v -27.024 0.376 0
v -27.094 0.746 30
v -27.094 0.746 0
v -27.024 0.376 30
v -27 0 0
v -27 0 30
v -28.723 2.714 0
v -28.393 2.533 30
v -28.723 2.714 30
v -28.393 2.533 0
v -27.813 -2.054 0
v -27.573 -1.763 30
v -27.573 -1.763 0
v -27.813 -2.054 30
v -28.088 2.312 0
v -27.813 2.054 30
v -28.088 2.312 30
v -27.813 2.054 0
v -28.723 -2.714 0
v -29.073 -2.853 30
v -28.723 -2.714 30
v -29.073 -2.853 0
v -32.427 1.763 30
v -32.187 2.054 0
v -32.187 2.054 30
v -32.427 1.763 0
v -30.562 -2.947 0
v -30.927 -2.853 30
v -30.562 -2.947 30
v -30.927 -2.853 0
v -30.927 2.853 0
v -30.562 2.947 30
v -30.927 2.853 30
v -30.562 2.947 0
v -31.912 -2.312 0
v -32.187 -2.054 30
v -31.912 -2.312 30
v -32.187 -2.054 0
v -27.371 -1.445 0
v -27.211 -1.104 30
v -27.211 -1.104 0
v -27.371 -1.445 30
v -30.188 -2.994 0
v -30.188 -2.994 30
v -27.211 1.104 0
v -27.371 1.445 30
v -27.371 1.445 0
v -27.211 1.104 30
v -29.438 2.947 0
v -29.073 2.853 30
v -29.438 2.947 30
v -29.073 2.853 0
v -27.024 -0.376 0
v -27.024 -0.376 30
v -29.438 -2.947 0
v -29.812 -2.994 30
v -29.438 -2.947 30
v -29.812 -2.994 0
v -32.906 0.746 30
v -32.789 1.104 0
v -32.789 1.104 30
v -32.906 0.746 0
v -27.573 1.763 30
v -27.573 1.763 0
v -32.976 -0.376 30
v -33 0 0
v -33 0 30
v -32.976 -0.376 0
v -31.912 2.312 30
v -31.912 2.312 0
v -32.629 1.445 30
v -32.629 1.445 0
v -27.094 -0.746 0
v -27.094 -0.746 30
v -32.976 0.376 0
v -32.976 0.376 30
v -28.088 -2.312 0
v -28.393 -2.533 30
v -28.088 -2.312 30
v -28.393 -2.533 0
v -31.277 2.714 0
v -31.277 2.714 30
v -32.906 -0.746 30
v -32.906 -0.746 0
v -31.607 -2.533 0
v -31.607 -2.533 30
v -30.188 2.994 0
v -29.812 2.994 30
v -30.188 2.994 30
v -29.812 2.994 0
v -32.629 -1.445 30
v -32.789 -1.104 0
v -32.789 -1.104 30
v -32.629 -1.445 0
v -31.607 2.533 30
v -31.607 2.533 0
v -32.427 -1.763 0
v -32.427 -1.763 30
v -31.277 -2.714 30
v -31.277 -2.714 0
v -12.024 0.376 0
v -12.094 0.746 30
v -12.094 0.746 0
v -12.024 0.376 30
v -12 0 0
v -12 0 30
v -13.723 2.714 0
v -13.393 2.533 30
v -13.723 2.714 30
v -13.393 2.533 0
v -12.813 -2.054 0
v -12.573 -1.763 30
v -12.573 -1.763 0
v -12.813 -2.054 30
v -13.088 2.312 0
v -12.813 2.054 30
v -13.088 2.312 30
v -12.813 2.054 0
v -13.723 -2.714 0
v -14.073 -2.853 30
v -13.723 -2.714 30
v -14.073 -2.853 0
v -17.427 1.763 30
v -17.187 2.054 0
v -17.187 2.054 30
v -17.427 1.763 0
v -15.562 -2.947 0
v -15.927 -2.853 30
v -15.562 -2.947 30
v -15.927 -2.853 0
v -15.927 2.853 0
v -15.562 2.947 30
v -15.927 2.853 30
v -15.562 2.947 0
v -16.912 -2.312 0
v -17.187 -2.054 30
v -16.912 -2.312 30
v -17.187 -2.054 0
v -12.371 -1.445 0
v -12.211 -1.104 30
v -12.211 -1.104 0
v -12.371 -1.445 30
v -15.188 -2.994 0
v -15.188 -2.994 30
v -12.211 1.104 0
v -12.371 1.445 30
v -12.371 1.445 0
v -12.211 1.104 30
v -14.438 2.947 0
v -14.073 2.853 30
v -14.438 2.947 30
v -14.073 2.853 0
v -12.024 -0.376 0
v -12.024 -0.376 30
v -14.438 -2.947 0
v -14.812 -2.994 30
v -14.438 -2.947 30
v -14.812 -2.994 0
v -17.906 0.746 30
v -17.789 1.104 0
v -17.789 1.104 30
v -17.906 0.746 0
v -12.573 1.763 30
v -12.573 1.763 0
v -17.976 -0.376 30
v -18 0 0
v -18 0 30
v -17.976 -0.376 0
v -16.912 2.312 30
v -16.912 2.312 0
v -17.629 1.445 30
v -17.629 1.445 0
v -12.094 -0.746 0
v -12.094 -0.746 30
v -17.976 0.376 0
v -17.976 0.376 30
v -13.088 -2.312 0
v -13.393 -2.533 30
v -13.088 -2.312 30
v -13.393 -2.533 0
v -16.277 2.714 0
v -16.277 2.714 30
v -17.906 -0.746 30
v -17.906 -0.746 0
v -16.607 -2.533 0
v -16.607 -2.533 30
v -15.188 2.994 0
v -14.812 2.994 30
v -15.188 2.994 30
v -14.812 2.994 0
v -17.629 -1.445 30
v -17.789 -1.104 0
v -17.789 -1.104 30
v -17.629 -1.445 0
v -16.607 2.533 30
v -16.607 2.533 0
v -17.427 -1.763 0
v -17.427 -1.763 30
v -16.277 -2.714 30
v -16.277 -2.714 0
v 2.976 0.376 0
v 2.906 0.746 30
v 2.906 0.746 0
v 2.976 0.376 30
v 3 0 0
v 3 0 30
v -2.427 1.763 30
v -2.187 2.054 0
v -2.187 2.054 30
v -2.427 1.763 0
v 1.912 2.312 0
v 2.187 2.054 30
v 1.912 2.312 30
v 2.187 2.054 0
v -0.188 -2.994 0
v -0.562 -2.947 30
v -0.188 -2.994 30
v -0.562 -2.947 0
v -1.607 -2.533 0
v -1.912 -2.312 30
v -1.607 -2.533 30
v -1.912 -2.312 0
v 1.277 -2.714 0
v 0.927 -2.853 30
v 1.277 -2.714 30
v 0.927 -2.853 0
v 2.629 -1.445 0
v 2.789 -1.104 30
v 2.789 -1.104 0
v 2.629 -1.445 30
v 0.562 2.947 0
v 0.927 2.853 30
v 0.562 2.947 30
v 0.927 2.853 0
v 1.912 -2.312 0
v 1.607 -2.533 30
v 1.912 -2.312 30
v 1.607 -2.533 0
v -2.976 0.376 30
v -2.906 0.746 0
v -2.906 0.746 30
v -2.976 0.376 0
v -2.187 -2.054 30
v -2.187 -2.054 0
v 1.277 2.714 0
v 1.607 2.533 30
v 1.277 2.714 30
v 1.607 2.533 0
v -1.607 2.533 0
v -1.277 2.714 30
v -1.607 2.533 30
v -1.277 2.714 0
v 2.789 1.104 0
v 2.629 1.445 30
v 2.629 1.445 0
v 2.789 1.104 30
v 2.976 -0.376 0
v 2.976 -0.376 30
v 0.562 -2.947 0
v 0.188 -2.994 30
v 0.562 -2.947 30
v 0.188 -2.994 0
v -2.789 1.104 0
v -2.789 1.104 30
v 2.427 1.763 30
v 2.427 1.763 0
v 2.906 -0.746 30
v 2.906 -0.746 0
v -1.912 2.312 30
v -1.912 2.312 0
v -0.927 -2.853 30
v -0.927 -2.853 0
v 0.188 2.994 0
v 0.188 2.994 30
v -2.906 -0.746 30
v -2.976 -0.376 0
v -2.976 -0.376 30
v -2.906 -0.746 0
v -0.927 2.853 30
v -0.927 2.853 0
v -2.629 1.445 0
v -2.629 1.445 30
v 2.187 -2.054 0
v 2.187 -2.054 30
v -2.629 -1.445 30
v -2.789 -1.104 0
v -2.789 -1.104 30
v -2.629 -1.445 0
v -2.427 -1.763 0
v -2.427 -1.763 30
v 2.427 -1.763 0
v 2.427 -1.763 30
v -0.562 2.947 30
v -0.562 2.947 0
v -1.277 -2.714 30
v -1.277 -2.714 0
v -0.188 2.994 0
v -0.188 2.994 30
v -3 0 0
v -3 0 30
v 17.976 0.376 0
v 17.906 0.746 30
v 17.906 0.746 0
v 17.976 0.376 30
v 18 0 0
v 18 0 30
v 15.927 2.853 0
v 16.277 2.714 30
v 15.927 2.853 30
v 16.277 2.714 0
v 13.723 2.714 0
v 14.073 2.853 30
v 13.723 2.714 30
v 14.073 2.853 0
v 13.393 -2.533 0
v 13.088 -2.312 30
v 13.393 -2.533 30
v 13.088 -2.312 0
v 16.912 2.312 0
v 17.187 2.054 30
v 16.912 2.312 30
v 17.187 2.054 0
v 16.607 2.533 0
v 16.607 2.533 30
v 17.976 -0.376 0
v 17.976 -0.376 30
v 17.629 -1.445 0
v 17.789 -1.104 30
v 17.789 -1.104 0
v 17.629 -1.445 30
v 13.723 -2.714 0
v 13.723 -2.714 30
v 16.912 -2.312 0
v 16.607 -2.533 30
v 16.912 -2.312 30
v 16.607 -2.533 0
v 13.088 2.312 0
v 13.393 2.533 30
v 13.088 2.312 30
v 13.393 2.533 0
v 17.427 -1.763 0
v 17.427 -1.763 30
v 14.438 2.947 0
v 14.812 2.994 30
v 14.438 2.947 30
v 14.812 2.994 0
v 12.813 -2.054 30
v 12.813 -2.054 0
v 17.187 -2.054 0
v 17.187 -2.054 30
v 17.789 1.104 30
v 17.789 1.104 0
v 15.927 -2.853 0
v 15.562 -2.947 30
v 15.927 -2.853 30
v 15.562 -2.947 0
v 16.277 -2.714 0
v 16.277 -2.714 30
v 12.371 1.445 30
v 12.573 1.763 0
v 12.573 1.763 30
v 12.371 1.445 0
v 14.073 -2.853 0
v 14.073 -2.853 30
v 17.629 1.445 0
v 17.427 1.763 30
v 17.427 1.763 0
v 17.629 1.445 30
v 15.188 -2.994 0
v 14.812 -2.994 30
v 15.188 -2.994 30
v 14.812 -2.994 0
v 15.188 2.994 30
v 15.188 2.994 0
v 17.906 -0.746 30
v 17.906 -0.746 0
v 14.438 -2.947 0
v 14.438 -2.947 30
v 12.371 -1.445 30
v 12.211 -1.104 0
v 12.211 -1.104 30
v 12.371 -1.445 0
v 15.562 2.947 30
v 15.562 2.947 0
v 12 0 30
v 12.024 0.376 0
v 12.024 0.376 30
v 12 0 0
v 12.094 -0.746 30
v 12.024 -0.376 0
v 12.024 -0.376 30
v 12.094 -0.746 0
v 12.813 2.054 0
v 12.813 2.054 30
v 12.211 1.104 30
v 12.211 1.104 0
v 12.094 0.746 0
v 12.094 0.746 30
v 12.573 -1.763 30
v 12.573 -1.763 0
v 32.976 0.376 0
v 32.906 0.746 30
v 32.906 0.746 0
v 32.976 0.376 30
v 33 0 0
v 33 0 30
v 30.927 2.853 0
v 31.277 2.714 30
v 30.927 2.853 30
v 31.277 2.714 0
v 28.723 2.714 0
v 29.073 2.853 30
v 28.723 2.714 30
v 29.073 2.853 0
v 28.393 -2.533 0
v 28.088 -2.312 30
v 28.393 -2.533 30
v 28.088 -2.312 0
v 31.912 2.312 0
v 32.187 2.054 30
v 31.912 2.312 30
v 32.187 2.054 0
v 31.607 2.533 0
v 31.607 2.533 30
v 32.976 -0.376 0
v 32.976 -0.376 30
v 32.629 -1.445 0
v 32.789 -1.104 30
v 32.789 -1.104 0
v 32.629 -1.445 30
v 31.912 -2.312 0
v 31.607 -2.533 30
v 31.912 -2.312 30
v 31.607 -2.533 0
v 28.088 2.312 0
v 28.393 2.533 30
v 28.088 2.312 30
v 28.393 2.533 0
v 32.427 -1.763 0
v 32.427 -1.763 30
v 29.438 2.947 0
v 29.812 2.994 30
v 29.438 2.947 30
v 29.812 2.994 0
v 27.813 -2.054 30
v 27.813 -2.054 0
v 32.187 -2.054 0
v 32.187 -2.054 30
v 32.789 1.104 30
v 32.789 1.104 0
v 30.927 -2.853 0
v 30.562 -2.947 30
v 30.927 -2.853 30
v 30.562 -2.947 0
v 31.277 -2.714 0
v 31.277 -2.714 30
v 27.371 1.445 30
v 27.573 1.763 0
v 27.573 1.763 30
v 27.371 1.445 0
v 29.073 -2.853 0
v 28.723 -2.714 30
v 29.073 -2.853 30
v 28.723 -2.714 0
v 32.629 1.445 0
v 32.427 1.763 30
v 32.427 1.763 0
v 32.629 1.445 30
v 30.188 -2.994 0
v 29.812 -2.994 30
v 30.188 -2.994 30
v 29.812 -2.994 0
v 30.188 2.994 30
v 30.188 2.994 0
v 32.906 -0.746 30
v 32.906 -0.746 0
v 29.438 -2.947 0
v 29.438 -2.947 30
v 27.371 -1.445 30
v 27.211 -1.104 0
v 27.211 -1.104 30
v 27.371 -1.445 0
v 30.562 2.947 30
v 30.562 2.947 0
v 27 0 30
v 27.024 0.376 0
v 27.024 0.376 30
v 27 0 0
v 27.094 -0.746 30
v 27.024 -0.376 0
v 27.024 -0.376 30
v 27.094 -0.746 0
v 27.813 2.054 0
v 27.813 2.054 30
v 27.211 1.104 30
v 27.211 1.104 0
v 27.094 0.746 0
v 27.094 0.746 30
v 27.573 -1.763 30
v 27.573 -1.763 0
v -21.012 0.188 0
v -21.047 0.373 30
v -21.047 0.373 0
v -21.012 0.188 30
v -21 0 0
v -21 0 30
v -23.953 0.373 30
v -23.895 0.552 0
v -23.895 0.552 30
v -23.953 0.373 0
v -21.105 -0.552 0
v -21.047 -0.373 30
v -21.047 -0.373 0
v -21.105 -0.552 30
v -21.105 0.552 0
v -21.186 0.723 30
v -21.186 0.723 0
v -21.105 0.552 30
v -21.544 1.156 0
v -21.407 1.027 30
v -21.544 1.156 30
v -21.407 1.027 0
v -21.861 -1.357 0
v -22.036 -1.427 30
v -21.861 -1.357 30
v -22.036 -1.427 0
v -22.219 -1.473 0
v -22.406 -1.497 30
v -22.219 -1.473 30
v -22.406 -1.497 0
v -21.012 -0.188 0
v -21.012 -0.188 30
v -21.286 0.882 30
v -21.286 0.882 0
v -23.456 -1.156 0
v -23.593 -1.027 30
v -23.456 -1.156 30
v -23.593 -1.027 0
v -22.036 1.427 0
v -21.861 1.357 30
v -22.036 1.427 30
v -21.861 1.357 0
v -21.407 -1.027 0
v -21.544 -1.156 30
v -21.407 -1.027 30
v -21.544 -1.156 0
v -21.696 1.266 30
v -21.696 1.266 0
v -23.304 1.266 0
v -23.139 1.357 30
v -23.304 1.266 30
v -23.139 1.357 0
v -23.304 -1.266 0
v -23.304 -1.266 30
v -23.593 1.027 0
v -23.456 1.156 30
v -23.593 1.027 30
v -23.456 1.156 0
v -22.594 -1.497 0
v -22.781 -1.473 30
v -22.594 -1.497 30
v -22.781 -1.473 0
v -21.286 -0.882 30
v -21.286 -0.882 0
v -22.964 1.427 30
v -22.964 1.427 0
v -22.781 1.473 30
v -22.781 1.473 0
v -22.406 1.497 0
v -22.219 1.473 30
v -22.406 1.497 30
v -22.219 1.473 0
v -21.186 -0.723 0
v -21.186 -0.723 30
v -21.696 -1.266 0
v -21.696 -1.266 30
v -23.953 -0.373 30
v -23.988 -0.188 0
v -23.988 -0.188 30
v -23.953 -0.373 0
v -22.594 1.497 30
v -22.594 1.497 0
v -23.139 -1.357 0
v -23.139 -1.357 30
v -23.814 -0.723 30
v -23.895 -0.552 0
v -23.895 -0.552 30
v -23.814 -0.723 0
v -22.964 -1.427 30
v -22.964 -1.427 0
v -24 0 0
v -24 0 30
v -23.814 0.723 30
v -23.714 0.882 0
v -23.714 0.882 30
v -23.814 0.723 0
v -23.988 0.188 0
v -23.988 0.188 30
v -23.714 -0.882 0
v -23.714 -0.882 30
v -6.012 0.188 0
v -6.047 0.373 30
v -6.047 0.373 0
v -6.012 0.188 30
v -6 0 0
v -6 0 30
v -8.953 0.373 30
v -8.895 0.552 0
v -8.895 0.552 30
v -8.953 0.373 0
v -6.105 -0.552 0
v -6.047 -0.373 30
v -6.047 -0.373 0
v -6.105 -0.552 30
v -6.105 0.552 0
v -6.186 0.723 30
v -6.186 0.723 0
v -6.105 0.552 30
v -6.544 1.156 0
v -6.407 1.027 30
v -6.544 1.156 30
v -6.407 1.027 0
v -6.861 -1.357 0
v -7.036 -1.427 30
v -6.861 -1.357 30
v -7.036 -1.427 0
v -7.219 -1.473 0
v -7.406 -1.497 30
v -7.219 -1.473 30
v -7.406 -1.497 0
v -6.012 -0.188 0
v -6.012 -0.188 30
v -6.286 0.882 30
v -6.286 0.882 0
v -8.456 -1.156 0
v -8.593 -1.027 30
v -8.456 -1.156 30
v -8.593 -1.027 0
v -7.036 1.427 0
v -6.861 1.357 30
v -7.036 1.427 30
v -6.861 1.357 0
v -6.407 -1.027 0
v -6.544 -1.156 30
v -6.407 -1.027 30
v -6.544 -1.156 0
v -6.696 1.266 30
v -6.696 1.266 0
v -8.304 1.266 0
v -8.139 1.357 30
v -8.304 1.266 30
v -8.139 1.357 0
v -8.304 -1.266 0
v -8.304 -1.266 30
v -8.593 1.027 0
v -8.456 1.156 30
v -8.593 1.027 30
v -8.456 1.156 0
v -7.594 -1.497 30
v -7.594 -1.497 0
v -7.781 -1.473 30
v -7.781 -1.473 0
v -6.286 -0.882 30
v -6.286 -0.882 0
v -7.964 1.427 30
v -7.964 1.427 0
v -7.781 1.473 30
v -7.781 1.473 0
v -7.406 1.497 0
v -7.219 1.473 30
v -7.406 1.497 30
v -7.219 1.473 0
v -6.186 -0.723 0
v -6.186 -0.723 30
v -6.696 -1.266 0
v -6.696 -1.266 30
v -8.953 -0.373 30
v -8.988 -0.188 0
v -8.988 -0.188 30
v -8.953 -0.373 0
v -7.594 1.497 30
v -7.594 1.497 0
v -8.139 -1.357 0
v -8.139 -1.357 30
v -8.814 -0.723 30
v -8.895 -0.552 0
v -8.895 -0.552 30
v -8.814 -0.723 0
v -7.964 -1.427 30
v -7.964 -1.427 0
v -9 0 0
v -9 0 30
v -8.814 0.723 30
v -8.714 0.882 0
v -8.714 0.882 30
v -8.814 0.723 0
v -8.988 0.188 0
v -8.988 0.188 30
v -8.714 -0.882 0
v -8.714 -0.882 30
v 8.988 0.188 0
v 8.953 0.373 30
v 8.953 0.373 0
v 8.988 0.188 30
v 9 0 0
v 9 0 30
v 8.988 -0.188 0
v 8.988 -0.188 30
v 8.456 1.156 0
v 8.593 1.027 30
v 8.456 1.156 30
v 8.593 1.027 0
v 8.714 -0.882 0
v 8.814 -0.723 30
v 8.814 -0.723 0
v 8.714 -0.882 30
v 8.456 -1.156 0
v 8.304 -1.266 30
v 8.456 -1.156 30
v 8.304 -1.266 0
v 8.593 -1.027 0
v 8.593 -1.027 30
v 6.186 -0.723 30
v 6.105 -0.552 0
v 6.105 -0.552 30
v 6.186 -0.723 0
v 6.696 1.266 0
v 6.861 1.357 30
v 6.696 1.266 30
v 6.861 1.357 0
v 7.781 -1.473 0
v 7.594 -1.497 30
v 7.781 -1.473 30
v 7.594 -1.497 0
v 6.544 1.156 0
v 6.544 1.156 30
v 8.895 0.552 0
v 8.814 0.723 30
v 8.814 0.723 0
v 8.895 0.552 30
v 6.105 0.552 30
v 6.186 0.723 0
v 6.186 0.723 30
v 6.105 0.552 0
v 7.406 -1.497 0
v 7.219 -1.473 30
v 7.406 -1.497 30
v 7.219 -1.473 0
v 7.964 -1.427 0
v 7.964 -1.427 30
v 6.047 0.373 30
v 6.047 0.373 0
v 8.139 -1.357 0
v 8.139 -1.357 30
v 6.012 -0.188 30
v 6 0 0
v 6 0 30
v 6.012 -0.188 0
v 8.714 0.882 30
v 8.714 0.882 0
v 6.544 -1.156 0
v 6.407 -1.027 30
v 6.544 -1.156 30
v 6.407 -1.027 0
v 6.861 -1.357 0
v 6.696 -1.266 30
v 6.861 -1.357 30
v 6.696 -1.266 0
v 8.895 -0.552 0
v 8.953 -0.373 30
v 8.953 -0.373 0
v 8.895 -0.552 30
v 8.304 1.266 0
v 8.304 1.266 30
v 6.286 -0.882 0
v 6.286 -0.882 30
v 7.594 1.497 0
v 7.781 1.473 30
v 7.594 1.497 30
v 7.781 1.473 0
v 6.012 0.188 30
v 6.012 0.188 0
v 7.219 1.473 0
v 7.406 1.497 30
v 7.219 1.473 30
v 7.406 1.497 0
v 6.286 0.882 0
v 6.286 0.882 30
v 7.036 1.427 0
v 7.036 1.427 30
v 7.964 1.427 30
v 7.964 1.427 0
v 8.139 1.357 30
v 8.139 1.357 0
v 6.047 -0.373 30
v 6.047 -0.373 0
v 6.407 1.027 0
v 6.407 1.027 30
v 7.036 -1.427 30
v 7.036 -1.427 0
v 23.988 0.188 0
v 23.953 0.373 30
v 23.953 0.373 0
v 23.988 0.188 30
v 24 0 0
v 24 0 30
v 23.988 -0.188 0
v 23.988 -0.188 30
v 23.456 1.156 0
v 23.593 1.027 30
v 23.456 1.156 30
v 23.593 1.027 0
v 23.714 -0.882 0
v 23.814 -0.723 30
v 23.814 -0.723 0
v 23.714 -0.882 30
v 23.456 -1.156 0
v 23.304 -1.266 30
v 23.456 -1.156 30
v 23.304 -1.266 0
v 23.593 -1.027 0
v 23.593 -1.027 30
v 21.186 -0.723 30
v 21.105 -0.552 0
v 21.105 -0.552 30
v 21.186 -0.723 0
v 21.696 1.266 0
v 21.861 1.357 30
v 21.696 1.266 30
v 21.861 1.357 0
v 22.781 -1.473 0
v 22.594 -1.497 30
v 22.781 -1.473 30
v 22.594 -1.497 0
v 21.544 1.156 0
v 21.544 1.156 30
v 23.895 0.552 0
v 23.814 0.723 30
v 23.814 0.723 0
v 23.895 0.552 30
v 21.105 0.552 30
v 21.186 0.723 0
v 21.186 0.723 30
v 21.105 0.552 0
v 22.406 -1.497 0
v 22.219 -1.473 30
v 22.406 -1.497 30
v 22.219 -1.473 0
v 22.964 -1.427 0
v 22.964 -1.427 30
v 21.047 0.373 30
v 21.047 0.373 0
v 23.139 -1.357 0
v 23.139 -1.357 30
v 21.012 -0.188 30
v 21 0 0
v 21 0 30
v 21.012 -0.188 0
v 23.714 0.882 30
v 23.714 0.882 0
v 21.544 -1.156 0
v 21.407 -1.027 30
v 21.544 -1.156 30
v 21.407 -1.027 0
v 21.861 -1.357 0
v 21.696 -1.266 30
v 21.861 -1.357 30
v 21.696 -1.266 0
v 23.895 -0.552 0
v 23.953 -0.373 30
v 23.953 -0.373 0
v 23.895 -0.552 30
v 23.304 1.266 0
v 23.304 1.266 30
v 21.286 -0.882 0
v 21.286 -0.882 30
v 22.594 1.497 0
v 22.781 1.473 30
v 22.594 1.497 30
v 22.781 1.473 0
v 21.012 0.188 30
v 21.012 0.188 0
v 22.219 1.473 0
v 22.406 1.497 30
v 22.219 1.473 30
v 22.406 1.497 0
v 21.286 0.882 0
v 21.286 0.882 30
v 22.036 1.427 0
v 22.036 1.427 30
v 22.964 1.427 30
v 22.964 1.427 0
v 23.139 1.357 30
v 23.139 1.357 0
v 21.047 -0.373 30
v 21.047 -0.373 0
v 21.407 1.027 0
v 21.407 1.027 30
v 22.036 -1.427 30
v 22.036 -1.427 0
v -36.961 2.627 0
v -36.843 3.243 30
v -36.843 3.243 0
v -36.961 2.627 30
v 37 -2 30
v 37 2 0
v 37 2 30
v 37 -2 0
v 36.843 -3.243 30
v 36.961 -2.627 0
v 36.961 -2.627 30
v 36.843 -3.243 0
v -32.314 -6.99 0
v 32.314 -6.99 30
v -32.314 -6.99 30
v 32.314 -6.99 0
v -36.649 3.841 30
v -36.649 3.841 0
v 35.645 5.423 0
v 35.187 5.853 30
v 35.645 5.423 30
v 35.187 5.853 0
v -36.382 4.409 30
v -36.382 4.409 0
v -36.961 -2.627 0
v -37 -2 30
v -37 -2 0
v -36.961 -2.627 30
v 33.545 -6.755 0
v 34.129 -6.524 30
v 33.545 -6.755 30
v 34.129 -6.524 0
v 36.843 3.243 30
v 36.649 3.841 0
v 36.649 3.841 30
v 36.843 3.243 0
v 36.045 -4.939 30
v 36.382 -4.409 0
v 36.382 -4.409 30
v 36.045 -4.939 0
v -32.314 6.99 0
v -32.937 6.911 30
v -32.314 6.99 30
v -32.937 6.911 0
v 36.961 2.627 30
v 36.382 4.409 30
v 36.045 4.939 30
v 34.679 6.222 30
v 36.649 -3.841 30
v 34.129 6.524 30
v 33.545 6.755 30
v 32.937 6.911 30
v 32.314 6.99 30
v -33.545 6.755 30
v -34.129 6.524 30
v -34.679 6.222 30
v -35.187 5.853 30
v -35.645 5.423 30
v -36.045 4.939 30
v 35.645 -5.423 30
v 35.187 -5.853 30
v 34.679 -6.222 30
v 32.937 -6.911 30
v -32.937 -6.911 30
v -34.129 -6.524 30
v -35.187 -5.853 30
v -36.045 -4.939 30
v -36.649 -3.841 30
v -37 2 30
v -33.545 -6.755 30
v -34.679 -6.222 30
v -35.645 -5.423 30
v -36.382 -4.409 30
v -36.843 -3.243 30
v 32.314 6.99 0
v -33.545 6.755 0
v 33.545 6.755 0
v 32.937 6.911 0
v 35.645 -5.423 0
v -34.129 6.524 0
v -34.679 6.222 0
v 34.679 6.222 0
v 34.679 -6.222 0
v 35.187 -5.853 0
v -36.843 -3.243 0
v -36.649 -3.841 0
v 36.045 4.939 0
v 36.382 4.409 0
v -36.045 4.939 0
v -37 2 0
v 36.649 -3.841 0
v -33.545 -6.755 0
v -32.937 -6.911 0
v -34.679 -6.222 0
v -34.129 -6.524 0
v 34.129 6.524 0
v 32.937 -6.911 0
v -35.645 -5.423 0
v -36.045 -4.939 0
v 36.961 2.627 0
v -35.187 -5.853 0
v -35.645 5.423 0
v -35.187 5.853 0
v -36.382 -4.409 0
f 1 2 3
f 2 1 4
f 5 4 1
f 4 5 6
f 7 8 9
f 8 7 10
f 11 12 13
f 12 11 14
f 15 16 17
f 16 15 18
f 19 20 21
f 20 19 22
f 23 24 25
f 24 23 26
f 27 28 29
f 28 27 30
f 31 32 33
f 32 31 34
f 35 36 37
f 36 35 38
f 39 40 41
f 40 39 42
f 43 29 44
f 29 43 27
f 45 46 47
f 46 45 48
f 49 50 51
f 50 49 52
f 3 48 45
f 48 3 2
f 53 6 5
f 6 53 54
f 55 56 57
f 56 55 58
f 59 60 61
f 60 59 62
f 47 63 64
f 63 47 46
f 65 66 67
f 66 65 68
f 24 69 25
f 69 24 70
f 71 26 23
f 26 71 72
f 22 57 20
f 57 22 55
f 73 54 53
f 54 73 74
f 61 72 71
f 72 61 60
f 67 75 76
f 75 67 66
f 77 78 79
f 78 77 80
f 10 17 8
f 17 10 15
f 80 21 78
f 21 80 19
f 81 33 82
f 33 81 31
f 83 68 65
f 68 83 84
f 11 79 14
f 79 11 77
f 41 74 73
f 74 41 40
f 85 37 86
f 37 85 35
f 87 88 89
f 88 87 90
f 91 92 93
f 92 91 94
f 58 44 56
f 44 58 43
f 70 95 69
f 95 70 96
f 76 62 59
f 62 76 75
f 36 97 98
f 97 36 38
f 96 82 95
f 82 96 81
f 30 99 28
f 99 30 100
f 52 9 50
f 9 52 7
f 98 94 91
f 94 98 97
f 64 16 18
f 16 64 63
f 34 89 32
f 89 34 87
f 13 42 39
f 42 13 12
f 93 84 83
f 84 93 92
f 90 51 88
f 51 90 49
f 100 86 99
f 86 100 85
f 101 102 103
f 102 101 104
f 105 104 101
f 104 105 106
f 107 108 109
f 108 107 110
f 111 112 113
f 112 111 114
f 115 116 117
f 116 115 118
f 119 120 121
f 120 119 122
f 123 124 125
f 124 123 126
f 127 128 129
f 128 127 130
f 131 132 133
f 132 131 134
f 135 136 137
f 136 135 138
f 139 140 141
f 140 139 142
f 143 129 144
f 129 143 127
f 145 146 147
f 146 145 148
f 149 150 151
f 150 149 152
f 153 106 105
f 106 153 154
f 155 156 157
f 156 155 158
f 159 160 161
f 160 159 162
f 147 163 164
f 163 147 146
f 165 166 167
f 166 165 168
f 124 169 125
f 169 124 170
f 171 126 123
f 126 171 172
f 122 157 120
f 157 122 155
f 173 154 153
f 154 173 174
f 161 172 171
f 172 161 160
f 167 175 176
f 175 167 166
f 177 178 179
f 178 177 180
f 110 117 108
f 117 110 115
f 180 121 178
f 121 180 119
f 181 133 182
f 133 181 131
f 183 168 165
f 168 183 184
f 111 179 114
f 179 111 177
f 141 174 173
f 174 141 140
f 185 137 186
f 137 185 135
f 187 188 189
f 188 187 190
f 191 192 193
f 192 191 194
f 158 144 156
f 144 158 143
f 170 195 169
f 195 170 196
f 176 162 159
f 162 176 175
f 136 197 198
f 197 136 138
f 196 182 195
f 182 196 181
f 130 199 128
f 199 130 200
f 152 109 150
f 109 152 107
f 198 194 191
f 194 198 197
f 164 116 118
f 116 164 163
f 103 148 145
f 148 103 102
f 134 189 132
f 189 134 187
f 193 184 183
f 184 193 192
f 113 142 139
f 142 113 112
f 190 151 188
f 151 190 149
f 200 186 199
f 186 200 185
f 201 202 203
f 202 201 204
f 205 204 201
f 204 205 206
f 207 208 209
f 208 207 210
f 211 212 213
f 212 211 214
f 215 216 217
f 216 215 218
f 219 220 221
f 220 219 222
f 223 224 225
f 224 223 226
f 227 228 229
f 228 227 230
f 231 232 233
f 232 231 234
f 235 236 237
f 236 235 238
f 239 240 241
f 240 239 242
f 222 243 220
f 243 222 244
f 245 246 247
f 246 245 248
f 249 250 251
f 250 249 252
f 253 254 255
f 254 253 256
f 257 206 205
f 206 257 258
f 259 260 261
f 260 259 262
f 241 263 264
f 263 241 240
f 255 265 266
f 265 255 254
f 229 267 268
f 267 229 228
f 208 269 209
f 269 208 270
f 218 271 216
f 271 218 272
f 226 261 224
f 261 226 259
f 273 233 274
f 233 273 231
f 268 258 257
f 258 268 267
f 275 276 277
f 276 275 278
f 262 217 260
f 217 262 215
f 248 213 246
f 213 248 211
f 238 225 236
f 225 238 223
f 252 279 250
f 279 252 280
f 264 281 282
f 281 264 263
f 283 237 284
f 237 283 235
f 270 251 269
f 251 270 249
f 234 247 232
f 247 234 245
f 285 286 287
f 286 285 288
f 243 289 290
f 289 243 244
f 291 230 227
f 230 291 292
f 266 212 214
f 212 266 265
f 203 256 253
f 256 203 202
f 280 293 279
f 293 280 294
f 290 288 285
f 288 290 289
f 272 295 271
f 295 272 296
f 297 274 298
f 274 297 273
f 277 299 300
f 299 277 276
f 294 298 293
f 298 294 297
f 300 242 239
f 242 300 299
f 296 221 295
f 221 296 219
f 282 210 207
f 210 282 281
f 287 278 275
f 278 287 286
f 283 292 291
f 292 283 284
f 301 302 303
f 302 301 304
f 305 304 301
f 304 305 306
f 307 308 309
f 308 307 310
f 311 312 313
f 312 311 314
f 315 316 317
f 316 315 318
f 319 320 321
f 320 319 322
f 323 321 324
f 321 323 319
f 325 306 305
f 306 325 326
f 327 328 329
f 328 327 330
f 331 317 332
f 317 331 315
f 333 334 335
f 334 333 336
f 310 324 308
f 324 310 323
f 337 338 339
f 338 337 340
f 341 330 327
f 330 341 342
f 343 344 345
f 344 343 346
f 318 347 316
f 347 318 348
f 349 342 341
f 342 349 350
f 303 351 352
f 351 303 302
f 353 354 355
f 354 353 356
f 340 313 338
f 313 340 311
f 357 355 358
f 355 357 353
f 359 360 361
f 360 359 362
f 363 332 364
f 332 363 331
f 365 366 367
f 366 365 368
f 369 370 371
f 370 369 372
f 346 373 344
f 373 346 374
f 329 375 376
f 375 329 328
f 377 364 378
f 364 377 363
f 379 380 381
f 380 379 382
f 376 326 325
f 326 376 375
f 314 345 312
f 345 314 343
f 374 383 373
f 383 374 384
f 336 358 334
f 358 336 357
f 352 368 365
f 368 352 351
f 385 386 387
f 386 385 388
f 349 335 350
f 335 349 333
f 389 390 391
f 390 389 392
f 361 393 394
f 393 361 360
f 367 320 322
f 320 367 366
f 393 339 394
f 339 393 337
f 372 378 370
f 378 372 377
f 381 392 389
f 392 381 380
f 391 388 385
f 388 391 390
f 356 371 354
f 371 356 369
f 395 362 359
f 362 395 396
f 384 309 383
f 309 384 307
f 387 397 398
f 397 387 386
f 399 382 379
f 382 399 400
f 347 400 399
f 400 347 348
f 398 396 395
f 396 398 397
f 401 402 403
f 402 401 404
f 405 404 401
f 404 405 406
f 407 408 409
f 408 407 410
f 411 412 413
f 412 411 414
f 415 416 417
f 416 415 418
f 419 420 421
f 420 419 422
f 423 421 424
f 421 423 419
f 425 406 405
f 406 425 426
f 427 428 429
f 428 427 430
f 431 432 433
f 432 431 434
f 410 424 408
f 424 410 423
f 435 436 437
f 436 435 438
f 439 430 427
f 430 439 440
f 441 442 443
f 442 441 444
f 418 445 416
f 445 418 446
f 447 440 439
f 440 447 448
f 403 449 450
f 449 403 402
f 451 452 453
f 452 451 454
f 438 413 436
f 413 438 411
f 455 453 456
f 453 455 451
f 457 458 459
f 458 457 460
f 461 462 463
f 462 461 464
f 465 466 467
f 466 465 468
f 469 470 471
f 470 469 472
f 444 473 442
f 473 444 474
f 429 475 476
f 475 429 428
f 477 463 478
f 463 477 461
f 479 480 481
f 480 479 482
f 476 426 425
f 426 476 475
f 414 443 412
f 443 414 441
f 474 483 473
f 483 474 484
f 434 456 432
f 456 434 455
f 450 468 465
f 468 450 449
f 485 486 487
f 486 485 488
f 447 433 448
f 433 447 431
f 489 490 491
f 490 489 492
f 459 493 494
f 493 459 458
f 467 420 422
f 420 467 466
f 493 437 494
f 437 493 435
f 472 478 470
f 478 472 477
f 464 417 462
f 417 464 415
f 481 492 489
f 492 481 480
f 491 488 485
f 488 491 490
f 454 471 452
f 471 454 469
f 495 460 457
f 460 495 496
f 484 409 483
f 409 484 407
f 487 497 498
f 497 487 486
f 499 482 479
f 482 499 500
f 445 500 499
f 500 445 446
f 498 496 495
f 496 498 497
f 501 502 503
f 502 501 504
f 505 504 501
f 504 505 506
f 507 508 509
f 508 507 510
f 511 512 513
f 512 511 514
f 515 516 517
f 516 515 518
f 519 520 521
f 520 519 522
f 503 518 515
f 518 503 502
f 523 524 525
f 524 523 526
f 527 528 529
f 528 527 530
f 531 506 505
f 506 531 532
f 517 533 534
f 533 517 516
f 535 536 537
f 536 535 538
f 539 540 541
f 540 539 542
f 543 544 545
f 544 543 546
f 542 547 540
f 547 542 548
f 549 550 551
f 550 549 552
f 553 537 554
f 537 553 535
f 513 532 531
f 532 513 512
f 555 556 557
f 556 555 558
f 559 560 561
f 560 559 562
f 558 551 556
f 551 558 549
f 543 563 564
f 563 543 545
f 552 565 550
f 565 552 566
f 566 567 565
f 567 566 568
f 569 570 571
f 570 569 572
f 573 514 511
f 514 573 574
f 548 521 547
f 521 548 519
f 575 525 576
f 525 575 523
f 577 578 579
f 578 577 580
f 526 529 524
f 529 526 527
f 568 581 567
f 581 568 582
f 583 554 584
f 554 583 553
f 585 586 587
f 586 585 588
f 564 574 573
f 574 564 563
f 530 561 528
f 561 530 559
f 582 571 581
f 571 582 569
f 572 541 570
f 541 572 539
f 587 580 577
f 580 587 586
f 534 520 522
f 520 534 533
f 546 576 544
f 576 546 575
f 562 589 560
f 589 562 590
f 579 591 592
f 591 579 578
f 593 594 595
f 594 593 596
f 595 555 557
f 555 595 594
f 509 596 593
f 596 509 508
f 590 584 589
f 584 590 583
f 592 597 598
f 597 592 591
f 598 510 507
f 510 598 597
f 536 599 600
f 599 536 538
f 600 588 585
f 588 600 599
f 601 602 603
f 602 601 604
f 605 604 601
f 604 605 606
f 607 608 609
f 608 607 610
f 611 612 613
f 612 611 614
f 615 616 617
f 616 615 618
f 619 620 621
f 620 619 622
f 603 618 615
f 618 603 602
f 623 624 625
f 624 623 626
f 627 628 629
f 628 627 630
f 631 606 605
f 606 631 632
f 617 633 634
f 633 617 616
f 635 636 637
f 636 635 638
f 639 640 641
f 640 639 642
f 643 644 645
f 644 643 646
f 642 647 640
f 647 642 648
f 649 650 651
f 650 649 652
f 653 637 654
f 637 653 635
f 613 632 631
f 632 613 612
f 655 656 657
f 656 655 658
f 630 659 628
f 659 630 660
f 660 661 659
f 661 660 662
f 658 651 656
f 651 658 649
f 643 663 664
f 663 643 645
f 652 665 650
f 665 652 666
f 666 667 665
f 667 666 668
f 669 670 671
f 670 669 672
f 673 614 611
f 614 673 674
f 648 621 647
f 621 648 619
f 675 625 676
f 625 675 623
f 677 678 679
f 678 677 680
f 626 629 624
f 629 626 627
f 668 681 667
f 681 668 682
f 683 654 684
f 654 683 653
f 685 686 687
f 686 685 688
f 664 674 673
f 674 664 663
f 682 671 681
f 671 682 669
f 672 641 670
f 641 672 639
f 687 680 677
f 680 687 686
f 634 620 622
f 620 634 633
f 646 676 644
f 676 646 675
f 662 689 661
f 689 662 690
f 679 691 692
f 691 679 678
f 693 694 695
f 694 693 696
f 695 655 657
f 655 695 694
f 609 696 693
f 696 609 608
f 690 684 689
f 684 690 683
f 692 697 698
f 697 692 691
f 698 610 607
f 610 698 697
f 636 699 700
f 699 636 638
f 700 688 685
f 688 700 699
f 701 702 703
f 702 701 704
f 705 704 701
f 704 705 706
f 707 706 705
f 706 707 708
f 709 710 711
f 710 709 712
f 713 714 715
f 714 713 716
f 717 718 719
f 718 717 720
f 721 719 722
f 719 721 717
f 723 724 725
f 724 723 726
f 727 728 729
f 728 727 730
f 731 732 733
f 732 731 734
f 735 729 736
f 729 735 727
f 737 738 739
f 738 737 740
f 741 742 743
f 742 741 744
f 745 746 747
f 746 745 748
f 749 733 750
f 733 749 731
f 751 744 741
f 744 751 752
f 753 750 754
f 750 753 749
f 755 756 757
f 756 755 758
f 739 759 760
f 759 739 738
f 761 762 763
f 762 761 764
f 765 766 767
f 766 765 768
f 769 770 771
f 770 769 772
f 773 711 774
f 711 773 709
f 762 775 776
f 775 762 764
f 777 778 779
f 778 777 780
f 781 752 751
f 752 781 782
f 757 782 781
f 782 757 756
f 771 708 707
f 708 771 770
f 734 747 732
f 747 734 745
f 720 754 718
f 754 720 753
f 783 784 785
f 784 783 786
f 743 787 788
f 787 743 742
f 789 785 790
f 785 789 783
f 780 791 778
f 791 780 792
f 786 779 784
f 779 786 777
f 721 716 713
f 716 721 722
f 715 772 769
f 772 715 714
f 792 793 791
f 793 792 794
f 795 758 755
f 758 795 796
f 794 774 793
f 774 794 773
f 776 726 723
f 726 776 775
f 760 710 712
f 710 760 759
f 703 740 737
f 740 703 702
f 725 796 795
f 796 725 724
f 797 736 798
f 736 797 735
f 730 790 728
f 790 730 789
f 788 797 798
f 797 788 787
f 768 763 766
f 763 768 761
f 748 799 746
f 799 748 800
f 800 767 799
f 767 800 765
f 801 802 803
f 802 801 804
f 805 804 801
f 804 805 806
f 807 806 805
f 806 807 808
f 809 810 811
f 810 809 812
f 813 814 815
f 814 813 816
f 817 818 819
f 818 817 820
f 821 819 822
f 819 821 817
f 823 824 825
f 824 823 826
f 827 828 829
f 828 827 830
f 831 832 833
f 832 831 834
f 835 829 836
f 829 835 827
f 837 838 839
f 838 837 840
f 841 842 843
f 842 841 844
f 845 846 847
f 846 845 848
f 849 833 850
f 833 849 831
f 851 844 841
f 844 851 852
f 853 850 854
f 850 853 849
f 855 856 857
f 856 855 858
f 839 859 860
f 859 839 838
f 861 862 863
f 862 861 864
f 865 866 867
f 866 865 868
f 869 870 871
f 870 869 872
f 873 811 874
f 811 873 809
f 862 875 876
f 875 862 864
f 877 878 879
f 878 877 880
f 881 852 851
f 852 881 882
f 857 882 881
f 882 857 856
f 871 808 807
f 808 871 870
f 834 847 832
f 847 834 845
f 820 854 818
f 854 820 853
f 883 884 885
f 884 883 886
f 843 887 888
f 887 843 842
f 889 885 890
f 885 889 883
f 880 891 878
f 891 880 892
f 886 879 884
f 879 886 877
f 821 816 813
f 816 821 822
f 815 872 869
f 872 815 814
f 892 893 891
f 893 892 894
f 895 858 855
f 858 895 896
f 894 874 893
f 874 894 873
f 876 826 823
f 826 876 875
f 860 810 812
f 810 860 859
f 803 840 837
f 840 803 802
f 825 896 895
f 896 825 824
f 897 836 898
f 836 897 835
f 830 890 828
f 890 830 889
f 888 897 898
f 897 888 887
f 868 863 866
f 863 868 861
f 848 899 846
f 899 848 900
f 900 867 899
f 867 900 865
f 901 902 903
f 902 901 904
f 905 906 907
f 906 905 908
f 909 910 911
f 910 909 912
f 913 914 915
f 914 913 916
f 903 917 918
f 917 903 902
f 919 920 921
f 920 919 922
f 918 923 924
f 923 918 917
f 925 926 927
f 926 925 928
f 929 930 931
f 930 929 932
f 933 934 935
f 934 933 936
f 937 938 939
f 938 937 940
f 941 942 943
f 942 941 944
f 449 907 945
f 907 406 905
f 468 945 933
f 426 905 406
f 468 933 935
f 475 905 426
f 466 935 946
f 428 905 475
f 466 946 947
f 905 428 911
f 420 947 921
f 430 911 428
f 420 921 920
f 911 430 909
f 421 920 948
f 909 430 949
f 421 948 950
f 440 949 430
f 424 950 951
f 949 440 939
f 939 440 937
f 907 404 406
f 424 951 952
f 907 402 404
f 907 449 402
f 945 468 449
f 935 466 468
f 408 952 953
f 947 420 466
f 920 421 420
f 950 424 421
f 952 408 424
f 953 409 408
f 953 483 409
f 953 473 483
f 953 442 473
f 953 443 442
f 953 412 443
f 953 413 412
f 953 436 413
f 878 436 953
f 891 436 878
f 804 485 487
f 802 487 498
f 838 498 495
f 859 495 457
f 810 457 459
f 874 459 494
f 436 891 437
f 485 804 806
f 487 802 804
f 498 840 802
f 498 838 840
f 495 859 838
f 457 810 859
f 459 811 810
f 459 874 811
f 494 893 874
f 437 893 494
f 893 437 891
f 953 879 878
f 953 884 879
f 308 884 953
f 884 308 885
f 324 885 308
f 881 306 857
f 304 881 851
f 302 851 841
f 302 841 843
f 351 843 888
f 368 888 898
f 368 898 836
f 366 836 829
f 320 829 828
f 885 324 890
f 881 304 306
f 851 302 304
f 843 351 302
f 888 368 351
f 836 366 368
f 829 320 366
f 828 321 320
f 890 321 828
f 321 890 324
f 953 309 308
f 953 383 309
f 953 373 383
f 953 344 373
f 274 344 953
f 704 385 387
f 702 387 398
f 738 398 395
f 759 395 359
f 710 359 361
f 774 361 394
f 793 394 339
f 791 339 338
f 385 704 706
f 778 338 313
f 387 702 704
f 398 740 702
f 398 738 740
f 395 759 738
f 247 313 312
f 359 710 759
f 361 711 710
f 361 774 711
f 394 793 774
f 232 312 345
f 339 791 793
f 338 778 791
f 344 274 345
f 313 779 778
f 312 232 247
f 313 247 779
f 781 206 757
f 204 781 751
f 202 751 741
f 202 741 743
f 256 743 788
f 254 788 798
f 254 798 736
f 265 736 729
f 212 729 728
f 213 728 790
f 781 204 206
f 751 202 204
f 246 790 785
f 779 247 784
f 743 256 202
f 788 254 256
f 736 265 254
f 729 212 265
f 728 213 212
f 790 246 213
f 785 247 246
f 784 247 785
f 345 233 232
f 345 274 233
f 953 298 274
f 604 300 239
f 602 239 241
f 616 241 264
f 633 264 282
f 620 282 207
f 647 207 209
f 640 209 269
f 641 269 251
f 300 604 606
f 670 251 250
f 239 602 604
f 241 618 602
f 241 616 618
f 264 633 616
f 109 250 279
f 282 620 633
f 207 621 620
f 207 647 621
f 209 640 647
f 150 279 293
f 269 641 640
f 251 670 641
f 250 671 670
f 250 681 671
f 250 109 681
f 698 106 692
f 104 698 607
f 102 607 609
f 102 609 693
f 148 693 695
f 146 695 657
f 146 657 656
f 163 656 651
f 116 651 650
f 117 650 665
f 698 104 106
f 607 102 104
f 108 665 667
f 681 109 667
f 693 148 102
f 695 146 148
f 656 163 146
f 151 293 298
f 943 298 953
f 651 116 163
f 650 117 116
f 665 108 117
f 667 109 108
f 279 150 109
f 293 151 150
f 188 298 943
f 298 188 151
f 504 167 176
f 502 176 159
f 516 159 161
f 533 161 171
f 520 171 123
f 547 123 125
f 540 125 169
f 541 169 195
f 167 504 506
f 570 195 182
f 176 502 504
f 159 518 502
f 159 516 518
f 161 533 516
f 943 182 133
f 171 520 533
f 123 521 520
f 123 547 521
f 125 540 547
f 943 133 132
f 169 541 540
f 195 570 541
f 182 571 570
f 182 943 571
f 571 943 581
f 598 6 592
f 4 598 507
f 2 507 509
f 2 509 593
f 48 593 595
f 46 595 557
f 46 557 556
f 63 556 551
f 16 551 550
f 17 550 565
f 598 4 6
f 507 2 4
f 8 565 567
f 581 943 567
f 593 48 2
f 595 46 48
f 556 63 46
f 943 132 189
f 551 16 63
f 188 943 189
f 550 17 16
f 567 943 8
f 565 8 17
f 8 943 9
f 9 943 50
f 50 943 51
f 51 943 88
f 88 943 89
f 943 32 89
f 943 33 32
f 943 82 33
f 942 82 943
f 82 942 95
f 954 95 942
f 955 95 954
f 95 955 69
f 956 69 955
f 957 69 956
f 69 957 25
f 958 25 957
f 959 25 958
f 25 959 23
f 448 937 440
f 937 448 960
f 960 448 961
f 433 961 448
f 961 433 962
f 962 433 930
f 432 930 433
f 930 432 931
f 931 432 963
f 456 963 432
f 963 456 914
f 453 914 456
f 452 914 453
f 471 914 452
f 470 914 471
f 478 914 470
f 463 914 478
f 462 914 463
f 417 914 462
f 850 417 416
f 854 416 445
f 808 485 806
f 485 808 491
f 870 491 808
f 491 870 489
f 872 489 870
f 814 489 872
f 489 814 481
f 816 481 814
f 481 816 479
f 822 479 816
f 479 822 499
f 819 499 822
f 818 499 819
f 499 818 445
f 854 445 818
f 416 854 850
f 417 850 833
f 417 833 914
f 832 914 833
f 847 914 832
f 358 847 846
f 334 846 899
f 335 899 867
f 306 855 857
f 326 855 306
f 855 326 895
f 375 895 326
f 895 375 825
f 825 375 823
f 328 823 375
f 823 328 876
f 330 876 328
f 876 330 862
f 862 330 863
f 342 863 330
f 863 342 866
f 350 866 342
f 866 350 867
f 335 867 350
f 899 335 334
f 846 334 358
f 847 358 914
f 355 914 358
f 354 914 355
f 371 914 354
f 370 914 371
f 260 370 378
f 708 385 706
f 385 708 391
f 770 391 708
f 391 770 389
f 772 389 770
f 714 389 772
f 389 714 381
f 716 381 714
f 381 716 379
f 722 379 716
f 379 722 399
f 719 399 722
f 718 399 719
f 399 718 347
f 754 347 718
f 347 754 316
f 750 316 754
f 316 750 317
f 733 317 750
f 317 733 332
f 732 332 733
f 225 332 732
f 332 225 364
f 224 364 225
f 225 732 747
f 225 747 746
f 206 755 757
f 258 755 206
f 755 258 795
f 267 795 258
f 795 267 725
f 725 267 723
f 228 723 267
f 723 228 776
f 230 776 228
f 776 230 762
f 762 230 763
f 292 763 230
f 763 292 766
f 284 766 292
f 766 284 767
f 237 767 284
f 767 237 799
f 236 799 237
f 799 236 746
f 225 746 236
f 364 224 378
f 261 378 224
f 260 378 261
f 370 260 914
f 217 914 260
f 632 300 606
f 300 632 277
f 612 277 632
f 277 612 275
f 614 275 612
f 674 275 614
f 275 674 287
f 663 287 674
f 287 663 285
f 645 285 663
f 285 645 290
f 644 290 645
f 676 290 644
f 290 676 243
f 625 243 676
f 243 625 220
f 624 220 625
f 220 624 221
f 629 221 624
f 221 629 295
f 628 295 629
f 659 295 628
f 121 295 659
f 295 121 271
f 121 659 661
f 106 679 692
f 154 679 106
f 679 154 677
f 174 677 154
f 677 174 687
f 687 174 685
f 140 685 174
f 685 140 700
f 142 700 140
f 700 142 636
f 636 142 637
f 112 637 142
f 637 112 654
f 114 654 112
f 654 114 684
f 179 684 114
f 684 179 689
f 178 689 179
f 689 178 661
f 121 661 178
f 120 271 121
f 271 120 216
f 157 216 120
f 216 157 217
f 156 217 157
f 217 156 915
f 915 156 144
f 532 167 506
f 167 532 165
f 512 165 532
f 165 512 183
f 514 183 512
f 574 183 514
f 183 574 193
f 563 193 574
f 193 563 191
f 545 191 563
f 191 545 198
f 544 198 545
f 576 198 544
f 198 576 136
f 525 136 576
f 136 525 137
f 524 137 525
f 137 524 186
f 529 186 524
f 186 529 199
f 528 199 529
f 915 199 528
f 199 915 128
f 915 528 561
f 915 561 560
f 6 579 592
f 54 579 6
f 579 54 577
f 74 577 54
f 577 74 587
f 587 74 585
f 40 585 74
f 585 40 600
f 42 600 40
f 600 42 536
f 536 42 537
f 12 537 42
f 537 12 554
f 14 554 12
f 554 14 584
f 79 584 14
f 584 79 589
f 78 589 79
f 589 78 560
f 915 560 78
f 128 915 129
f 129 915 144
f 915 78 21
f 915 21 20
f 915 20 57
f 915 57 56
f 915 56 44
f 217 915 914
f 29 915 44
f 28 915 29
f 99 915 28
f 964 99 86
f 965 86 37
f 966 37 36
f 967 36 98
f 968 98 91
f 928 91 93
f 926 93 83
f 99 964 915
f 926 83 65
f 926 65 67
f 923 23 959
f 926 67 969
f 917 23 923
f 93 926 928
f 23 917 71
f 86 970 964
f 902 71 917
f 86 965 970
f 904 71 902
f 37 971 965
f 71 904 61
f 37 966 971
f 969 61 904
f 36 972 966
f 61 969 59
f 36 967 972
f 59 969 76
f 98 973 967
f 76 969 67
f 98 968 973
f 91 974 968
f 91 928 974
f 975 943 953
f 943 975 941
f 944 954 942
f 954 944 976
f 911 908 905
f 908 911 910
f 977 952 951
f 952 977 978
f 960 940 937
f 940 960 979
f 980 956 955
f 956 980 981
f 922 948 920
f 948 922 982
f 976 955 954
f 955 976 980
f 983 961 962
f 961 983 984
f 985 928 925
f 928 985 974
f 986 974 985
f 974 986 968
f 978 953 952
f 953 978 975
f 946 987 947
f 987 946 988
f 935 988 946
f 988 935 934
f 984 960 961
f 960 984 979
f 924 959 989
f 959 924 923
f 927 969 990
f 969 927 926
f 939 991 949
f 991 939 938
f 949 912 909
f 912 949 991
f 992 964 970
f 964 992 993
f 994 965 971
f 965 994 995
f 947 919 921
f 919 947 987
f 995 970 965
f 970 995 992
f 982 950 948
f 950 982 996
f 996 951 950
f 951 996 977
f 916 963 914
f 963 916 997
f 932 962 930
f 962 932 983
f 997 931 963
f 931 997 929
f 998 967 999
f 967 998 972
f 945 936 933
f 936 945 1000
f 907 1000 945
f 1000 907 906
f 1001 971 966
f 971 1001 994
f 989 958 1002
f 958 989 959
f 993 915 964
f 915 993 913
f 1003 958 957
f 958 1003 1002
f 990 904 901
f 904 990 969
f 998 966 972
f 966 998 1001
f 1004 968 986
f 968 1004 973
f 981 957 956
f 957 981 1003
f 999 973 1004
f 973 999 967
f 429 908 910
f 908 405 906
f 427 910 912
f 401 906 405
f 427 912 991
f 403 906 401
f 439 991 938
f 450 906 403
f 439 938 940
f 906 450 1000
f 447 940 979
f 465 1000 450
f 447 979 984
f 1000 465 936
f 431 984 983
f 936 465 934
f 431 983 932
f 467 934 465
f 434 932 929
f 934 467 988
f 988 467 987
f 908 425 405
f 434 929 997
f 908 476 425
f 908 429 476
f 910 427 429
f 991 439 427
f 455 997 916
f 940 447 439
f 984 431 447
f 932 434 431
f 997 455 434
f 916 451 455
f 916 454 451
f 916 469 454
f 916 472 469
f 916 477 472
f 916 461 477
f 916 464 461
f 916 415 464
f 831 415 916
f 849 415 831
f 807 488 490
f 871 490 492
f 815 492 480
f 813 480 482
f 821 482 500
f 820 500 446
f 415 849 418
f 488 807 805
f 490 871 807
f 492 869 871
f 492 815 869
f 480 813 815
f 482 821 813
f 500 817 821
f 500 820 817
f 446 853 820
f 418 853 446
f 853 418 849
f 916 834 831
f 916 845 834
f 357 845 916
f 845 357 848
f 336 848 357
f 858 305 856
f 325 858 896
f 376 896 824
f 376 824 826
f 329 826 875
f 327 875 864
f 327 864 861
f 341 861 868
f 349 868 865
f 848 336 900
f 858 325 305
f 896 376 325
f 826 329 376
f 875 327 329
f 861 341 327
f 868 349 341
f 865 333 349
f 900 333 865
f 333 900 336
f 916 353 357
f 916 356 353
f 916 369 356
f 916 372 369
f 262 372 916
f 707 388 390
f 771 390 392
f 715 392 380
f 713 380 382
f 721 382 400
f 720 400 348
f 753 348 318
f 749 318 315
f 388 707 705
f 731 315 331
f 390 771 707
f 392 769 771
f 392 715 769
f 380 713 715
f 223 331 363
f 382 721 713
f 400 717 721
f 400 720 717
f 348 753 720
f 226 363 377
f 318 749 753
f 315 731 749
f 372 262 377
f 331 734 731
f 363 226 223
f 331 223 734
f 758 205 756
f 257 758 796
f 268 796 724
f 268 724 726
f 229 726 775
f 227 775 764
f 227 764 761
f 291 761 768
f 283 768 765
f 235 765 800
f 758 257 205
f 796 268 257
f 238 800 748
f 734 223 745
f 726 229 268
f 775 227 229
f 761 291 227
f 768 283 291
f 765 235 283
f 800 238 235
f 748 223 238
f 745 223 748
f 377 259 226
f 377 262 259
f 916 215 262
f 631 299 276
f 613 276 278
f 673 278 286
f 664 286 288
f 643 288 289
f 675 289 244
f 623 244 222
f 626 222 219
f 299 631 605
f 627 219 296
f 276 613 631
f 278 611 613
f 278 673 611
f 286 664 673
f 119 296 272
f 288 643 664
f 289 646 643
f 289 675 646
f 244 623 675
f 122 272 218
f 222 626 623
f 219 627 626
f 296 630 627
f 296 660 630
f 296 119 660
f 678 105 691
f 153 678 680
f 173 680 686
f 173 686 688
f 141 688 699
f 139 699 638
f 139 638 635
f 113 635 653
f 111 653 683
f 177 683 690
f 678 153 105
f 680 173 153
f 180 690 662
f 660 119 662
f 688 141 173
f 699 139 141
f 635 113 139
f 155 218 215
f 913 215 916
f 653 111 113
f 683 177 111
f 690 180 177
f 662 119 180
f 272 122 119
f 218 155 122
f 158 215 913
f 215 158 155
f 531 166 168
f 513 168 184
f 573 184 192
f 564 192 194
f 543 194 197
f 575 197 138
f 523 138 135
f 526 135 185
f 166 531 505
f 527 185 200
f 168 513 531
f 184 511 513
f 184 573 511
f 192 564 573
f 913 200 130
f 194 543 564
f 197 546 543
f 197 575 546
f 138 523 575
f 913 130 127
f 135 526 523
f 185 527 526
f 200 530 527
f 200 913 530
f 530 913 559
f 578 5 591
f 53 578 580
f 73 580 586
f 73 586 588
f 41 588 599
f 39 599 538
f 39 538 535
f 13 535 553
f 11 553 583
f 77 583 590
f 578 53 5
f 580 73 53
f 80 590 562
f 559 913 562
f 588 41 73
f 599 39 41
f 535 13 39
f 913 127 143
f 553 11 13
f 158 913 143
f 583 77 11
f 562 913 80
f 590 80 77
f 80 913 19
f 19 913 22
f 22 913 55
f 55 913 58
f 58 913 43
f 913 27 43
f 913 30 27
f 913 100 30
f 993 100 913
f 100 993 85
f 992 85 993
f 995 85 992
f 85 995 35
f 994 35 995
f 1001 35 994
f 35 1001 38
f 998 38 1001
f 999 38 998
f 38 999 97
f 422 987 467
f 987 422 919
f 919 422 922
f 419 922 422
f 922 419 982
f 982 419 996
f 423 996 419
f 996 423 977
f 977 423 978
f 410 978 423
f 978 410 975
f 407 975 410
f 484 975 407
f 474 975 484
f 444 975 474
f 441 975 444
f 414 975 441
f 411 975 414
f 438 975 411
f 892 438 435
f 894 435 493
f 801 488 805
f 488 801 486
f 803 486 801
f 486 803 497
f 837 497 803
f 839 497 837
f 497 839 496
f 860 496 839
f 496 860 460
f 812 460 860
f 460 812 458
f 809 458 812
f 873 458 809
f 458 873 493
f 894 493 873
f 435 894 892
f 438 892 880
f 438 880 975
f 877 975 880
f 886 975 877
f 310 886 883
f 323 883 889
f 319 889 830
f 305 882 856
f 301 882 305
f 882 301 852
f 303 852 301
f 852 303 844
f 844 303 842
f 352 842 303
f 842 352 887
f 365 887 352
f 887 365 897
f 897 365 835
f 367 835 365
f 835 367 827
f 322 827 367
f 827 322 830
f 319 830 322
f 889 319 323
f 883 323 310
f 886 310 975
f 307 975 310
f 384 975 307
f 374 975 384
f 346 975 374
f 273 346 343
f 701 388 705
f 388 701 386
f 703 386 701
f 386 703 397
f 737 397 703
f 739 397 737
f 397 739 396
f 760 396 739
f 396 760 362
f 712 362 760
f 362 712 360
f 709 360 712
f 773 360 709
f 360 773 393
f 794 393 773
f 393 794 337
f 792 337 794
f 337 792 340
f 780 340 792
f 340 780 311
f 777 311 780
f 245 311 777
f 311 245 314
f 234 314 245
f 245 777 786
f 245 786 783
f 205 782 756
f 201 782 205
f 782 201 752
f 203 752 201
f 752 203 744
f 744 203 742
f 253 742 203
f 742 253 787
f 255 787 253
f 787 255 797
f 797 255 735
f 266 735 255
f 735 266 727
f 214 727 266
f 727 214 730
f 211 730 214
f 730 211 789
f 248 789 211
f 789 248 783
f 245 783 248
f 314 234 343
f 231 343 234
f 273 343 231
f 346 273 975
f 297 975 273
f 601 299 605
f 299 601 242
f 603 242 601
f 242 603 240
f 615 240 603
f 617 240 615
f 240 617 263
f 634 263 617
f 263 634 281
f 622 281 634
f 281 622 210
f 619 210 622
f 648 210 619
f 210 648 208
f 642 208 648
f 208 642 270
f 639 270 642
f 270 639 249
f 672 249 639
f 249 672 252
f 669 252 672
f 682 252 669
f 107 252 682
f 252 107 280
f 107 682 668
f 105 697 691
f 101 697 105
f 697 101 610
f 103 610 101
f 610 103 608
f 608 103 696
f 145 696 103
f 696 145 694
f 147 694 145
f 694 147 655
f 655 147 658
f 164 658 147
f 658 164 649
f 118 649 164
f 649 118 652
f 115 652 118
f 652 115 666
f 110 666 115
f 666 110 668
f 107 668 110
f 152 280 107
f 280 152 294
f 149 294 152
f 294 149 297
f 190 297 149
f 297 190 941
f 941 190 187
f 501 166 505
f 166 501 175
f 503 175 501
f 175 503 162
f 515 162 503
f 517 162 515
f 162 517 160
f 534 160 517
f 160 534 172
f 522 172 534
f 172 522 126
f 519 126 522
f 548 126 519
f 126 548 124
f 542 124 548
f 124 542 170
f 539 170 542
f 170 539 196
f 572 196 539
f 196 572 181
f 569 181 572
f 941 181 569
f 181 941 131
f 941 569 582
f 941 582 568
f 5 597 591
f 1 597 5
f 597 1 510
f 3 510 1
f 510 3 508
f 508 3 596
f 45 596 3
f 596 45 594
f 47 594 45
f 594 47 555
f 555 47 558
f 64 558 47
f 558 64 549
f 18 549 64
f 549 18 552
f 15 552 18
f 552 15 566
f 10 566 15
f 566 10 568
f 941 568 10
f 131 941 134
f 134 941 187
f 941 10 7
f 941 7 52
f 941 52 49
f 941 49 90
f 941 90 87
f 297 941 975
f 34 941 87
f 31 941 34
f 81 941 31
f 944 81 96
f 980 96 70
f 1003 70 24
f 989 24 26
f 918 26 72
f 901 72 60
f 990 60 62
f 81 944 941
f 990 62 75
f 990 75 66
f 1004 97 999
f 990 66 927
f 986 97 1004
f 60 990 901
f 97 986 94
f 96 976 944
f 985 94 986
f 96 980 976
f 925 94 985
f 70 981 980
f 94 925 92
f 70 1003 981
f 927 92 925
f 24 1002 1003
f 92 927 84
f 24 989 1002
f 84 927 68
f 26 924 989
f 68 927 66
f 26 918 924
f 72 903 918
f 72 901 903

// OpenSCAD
$fn = 50;


difference() {
	union() {
		hull() {
			translate(v = [-32.0000000000, 2.0000000000, 0]) {
				cylinder(h = 30, r = 5);
			}
			translate(v = [32.0000000000, 2.0000000000, 0]) {
				cylinder(h = 30, r = 5);
			}
			translate(v = [-32.0000000000, -2.0000000000, 0]) {
				cylinder(h = 30, r = 5);
			}
			translate(v = [32.0000000000, -2.0000000000, 0]) {
				cylinder(h = 30, r = 5);
			}
		}
	}
	union() {
		translate(v = [-30.0000000000, 0.0000000000, 0]) {
			translate(v = [0, 0, -100]) {
				cylinder(h = 200, r = 3.0000000000);
			}
		}
		translate(v = [-15.0000000000, 0.0000000000, 0]) {
			translate(v = [0, 0, -100]) {
				cylinder(h = 200, r = 3.0000000000);
			}
		}
		translate(v = [0, 0, -100]) {
			cylinder(h = 200, r = 3.0000000000);
		}
		translate(v = [15.0000000000, 0.0000000000, 0]) {
			translate(v = [0, 0, -100]) {
				cylinder(h = 200, r = 3.0000000000);
			}
		}
		translate(v = [30.0000000000, 0.0000000000, 0]) {
			translate(v = [0, 0, -100]) {
				cylinder(h = 200, r = 3.0000000000);
			}
		}
		translate(v = [-30.0000000000, 0.0000000000, 0]) {
			translate(v = [0, 0, -100]) {
				cylinder(h = 200, r = 1.5000000000);
			}
		}
		translate(v = [-22.5000000000, 0.0000000000, 0]) {
			translate(v = [0, 0, -100]) {
				cylinder(h = 200, r = 1.5000000000);
			}
		}
		translate(v = [-15.0000000000, 0.0000000000, 0]) {
			translate(v = [0, 0, -100]) {
				cylinder(h = 200, r = 1.5000000000);
			}
		}
		translate(v = [-7.5000000000, 0.0000000000, 0]) {
			translate(v = [0, 0, -100]) {
				cylinder(h = 200, r = 1.5000000000);
			}
		}
		translate(v = [0, 0, -100]) {
			cylinder(h = 200, r = 1.5000000000);
		}
		translate(v = [7.5000000000, 0.0000000000, 0]) {
			translate(v = [0, 0, -100]) {
				cylinder(h = 200, r = 1.5000000000);
			}
		}
		translate(v = [15.0000000000, 0.0000000000, 0]) {
			translate(v = [0, 0, -100]) {
				cylinder(h = 200, r = 1.5000000000);
			}
		}
		translate(v = [22.5000000000, 0.0000000000, 0]) {
			translate(v = [0, 0, -100]) {
				cylinder(h = 200, r = 1.5000000000);
			}
		}
		translate(v = [30.0000000000, 0.0000000000, 0]) {
			translate(v = [0, 0, -100]) {
				cylinder(h = 200, r = 1.5000000000);
			}
		}
	}
}
